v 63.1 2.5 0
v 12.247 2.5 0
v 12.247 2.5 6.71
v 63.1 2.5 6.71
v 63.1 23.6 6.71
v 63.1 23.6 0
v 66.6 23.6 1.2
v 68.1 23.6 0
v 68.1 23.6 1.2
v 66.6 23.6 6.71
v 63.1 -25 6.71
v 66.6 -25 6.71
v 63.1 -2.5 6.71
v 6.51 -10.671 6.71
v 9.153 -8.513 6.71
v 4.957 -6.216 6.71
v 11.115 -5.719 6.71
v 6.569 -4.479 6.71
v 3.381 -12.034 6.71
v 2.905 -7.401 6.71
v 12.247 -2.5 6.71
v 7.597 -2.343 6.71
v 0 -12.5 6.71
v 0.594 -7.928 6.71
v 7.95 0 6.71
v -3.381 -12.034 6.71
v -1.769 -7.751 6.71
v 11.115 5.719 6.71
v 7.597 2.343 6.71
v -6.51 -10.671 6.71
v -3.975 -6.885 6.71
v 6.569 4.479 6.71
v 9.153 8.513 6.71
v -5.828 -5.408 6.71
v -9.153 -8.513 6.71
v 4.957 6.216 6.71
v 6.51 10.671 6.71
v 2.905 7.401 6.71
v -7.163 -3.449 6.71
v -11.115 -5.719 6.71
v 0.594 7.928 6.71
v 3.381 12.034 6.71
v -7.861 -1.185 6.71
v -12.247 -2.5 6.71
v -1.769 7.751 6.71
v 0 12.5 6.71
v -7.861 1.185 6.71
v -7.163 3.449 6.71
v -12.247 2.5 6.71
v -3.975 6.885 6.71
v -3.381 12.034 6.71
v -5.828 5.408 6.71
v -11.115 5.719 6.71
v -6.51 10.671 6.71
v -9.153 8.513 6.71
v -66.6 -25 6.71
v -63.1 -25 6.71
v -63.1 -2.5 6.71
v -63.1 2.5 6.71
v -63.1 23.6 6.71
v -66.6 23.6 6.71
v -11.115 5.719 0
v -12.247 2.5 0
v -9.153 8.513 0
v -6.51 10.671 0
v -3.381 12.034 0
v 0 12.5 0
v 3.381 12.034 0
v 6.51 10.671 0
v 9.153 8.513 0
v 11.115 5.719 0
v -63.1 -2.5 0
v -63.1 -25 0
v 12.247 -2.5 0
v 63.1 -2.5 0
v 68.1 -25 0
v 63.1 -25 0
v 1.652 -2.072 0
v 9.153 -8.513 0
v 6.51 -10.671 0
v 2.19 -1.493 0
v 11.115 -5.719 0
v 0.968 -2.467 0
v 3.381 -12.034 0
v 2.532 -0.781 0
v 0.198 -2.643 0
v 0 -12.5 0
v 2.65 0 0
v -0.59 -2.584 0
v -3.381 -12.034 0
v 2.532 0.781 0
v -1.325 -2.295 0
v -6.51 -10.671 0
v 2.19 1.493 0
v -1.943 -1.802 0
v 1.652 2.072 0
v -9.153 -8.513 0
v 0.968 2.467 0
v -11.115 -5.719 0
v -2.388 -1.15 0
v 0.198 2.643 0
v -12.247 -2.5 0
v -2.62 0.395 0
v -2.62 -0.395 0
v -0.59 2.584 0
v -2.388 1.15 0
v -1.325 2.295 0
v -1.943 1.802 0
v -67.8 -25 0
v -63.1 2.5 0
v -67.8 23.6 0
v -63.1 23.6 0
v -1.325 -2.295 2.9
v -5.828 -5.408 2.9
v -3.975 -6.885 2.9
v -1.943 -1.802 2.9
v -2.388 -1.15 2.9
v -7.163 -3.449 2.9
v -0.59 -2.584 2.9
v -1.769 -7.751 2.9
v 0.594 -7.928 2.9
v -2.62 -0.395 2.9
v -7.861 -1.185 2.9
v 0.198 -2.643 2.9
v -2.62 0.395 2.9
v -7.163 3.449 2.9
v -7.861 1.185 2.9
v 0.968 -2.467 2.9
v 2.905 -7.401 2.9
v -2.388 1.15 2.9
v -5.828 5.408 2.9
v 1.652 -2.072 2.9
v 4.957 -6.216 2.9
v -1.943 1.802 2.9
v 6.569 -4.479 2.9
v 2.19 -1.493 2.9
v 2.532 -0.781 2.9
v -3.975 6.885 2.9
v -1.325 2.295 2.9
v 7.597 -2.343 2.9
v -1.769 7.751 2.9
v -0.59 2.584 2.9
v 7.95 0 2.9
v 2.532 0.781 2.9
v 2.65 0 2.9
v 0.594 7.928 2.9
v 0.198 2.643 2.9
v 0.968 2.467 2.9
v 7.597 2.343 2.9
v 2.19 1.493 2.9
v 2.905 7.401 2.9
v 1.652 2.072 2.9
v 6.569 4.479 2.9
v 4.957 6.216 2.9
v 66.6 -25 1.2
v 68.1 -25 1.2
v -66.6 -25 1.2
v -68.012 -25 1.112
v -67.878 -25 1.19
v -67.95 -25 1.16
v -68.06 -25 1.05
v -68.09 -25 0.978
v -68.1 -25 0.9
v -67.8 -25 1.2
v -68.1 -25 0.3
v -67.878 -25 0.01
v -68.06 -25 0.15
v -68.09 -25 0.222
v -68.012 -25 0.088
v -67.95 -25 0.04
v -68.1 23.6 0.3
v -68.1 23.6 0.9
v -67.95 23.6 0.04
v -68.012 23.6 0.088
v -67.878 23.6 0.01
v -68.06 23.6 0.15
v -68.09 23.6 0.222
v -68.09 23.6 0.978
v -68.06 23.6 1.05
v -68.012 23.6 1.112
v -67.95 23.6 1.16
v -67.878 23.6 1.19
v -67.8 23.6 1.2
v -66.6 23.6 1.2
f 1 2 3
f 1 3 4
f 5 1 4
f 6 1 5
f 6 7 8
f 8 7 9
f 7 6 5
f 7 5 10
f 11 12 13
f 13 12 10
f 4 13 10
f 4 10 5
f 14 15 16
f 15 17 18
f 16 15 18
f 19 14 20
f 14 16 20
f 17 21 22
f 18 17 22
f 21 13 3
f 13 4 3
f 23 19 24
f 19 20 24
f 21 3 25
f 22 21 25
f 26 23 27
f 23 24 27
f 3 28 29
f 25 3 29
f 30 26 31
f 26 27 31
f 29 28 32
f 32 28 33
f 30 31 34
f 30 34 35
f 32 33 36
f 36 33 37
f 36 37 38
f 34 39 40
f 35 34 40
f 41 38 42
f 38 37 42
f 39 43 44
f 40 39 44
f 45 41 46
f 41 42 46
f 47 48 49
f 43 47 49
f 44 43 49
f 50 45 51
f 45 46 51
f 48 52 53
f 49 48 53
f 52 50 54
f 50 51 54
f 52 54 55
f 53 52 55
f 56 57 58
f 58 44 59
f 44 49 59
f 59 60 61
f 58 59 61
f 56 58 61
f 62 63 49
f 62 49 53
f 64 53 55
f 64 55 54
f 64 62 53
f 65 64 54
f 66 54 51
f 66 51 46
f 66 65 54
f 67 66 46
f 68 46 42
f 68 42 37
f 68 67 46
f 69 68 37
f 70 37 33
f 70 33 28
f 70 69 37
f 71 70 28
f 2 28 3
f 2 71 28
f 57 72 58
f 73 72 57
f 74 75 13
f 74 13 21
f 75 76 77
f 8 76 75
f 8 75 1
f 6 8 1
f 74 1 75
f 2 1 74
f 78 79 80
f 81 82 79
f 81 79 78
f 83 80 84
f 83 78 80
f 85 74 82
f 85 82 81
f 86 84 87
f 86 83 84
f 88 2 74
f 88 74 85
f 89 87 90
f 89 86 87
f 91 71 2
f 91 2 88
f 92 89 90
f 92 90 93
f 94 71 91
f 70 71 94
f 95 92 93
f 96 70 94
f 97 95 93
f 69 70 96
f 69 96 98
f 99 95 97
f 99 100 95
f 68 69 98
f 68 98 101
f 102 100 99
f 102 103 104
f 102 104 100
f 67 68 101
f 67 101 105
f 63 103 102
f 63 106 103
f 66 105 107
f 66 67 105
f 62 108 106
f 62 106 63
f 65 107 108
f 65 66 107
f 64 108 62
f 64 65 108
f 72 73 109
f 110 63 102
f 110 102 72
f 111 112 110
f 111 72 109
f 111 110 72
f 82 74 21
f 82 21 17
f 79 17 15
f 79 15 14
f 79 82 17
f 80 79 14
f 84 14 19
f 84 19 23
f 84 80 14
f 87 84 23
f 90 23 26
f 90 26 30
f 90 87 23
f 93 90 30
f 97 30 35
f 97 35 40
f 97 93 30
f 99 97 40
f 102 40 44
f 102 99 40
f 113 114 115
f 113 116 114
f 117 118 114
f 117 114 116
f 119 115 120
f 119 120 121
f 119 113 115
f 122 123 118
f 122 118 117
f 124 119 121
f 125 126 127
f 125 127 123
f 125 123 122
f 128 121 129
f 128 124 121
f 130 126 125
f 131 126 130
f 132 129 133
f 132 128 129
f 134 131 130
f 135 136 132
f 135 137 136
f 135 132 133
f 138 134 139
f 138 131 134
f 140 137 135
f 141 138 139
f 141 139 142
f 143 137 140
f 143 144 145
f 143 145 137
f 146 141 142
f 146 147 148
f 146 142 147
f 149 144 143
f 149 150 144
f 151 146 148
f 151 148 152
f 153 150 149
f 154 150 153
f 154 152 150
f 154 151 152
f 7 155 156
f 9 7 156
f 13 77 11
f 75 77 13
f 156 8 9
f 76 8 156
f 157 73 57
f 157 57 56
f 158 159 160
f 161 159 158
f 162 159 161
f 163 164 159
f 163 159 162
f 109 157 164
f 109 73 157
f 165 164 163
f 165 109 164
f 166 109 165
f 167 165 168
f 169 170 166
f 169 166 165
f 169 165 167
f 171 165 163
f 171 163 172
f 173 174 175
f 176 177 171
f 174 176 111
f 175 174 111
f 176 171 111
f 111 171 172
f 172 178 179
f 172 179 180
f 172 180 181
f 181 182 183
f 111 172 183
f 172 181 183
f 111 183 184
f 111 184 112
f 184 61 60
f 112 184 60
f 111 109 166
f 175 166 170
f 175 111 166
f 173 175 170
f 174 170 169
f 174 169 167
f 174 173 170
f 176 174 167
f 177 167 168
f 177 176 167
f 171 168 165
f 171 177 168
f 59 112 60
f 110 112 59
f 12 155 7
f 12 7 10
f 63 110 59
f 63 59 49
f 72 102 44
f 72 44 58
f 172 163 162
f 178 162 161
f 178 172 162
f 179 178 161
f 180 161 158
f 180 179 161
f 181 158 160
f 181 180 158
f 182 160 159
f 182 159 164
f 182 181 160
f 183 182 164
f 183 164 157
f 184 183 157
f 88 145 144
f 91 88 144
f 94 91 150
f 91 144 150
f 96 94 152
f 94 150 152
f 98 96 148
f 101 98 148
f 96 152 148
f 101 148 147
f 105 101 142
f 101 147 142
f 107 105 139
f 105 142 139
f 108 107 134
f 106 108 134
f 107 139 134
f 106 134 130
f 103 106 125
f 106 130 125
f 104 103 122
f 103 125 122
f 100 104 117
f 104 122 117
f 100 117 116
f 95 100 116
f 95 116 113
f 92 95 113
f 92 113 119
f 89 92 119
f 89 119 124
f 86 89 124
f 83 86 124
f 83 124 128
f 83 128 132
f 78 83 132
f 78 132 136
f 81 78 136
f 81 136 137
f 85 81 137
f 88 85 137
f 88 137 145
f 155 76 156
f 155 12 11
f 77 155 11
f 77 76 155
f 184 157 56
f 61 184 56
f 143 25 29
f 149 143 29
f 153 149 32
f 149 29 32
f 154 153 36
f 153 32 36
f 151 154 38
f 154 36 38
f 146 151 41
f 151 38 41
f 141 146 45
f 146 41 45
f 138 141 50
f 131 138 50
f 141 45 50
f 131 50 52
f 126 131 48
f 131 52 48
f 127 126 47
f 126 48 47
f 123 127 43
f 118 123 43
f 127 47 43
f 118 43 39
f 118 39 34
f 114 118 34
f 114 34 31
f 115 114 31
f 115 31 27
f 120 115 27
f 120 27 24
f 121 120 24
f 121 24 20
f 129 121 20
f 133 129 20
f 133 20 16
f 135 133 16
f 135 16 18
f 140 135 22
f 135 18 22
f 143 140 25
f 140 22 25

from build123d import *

# Parameters (mm, degrees)
BOSS_EXTRUDE1_DEPTH = 6.71
SKETCH2_W           = 1.5
SKETCH2_H           = 5.51
CUT_EXTRUDE1_DEPTH  = 51
SKETCH3_R           = 7.9502
CUT_EXTRUDE2_DEPTH  = 3.81
SKETCH4_W           = 136.2
SKETCH4_H           = 1.4
CUT_EXTRUDE3_DEPTH  = 7.71
SKETCH5_R           = 2.65
CUT_EXTRUDE4_DEPTH  = 3.9
FILLET1_R           = 0.3


with BuildPart() as part:
    # Sketch1 → Boss-Extrude1 (new body)
    with BuildSketch(Plane.XY):
        with BuildLine():
            Line((-63.1, 2.5), (-12.247448714, 2.5))
            ThreePointArc((-12.247448714, 2.5), (0, 12.5), (12.247448714, 2.5))
            Line((12.247448714, 2.5), (63.1, 2.5))
            Line((63.1, 2.5), (63.1, 25))
            Line((63.1, 25), (68.1, 25))
            Line((68.1, 25), (68.1, -25))
            Line((68.1, -25), (63.1, -25))
            Line((63.1, -25), (63.1, -2.5))
            Line((63.1, -2.5), (12.247448714, -2.5))
            ThreePointArc((12.247448714, -2.5), (0, -12.5), (-12.247448714, -2.5))
            Line((-12.247448714, -2.5), (-63.1, -2.5))
            Line((-63.1, -2.5), (-63.1, -25))
            Line((-63.1, -25), (-68.1, -25))
            Line((-68.1, -25), (-68.1, 25))
            Line((-68.1, 25), (-63.1, 25))
            Line((-63.1, 25), (-63.1, 2.5))
        make_face()
    extrude(amount=BOSS_EXTRUDE1_DEPTH)

    # Sketch2 → Cut-Extrude1 (cut, through all)
    with BuildSketch(Plane.XZ.offset(25)):
        with Locations((67.35, 3.955)):
            Rectangle(SKETCH2_W, SKETCH2_H)
        with Locations((-67.35, 3.955)):
            Rectangle(SKETCH2_W, SKETCH2_H)
    extrude(amount=-CUT_EXTRUDE1_DEPTH, mode=Mode.SUBTRACT)

    # Sketch3 → Cut-Extrude2 (cut)
    with BuildSketch(Plane.XY.offset(6.71)):
        Circle(SKETCH3_R)
    extrude(amount=-CUT_EXTRUDE2_DEPTH, mode=Mode.SUBTRACT)

    # Sketch4 → Cut-Extrude3 (cut, through all)
    with BuildSketch(Plane.XY.offset(6.71)):
        with Locations((0, 24.3)):
            Rectangle(SKETCH4_W, SKETCH4_H)
    extrude(amount=-CUT_EXTRUDE3_DEPTH, mode=Mode.SUBTRACT)

    # Sketch5 → Cut-Extrude4 (cut, through all)
    with BuildSketch(Plane.XY.offset(2.9)):
        Circle(SKETCH5_R)
    extrude(amount=-CUT_EXTRUDE4_DEPTH, mode=Mode.SUBTRACT)

    # Fillet1
    fillet1_edges = [part.edges().sort_by_distance(p)[0] for p in [
        (-68.1, -0.7, 1.2),
        (-68.1, -0.7, 0),
    ]]
    fillet(fillet1_edges, radius=FILLET1_R)


solid = part.part
